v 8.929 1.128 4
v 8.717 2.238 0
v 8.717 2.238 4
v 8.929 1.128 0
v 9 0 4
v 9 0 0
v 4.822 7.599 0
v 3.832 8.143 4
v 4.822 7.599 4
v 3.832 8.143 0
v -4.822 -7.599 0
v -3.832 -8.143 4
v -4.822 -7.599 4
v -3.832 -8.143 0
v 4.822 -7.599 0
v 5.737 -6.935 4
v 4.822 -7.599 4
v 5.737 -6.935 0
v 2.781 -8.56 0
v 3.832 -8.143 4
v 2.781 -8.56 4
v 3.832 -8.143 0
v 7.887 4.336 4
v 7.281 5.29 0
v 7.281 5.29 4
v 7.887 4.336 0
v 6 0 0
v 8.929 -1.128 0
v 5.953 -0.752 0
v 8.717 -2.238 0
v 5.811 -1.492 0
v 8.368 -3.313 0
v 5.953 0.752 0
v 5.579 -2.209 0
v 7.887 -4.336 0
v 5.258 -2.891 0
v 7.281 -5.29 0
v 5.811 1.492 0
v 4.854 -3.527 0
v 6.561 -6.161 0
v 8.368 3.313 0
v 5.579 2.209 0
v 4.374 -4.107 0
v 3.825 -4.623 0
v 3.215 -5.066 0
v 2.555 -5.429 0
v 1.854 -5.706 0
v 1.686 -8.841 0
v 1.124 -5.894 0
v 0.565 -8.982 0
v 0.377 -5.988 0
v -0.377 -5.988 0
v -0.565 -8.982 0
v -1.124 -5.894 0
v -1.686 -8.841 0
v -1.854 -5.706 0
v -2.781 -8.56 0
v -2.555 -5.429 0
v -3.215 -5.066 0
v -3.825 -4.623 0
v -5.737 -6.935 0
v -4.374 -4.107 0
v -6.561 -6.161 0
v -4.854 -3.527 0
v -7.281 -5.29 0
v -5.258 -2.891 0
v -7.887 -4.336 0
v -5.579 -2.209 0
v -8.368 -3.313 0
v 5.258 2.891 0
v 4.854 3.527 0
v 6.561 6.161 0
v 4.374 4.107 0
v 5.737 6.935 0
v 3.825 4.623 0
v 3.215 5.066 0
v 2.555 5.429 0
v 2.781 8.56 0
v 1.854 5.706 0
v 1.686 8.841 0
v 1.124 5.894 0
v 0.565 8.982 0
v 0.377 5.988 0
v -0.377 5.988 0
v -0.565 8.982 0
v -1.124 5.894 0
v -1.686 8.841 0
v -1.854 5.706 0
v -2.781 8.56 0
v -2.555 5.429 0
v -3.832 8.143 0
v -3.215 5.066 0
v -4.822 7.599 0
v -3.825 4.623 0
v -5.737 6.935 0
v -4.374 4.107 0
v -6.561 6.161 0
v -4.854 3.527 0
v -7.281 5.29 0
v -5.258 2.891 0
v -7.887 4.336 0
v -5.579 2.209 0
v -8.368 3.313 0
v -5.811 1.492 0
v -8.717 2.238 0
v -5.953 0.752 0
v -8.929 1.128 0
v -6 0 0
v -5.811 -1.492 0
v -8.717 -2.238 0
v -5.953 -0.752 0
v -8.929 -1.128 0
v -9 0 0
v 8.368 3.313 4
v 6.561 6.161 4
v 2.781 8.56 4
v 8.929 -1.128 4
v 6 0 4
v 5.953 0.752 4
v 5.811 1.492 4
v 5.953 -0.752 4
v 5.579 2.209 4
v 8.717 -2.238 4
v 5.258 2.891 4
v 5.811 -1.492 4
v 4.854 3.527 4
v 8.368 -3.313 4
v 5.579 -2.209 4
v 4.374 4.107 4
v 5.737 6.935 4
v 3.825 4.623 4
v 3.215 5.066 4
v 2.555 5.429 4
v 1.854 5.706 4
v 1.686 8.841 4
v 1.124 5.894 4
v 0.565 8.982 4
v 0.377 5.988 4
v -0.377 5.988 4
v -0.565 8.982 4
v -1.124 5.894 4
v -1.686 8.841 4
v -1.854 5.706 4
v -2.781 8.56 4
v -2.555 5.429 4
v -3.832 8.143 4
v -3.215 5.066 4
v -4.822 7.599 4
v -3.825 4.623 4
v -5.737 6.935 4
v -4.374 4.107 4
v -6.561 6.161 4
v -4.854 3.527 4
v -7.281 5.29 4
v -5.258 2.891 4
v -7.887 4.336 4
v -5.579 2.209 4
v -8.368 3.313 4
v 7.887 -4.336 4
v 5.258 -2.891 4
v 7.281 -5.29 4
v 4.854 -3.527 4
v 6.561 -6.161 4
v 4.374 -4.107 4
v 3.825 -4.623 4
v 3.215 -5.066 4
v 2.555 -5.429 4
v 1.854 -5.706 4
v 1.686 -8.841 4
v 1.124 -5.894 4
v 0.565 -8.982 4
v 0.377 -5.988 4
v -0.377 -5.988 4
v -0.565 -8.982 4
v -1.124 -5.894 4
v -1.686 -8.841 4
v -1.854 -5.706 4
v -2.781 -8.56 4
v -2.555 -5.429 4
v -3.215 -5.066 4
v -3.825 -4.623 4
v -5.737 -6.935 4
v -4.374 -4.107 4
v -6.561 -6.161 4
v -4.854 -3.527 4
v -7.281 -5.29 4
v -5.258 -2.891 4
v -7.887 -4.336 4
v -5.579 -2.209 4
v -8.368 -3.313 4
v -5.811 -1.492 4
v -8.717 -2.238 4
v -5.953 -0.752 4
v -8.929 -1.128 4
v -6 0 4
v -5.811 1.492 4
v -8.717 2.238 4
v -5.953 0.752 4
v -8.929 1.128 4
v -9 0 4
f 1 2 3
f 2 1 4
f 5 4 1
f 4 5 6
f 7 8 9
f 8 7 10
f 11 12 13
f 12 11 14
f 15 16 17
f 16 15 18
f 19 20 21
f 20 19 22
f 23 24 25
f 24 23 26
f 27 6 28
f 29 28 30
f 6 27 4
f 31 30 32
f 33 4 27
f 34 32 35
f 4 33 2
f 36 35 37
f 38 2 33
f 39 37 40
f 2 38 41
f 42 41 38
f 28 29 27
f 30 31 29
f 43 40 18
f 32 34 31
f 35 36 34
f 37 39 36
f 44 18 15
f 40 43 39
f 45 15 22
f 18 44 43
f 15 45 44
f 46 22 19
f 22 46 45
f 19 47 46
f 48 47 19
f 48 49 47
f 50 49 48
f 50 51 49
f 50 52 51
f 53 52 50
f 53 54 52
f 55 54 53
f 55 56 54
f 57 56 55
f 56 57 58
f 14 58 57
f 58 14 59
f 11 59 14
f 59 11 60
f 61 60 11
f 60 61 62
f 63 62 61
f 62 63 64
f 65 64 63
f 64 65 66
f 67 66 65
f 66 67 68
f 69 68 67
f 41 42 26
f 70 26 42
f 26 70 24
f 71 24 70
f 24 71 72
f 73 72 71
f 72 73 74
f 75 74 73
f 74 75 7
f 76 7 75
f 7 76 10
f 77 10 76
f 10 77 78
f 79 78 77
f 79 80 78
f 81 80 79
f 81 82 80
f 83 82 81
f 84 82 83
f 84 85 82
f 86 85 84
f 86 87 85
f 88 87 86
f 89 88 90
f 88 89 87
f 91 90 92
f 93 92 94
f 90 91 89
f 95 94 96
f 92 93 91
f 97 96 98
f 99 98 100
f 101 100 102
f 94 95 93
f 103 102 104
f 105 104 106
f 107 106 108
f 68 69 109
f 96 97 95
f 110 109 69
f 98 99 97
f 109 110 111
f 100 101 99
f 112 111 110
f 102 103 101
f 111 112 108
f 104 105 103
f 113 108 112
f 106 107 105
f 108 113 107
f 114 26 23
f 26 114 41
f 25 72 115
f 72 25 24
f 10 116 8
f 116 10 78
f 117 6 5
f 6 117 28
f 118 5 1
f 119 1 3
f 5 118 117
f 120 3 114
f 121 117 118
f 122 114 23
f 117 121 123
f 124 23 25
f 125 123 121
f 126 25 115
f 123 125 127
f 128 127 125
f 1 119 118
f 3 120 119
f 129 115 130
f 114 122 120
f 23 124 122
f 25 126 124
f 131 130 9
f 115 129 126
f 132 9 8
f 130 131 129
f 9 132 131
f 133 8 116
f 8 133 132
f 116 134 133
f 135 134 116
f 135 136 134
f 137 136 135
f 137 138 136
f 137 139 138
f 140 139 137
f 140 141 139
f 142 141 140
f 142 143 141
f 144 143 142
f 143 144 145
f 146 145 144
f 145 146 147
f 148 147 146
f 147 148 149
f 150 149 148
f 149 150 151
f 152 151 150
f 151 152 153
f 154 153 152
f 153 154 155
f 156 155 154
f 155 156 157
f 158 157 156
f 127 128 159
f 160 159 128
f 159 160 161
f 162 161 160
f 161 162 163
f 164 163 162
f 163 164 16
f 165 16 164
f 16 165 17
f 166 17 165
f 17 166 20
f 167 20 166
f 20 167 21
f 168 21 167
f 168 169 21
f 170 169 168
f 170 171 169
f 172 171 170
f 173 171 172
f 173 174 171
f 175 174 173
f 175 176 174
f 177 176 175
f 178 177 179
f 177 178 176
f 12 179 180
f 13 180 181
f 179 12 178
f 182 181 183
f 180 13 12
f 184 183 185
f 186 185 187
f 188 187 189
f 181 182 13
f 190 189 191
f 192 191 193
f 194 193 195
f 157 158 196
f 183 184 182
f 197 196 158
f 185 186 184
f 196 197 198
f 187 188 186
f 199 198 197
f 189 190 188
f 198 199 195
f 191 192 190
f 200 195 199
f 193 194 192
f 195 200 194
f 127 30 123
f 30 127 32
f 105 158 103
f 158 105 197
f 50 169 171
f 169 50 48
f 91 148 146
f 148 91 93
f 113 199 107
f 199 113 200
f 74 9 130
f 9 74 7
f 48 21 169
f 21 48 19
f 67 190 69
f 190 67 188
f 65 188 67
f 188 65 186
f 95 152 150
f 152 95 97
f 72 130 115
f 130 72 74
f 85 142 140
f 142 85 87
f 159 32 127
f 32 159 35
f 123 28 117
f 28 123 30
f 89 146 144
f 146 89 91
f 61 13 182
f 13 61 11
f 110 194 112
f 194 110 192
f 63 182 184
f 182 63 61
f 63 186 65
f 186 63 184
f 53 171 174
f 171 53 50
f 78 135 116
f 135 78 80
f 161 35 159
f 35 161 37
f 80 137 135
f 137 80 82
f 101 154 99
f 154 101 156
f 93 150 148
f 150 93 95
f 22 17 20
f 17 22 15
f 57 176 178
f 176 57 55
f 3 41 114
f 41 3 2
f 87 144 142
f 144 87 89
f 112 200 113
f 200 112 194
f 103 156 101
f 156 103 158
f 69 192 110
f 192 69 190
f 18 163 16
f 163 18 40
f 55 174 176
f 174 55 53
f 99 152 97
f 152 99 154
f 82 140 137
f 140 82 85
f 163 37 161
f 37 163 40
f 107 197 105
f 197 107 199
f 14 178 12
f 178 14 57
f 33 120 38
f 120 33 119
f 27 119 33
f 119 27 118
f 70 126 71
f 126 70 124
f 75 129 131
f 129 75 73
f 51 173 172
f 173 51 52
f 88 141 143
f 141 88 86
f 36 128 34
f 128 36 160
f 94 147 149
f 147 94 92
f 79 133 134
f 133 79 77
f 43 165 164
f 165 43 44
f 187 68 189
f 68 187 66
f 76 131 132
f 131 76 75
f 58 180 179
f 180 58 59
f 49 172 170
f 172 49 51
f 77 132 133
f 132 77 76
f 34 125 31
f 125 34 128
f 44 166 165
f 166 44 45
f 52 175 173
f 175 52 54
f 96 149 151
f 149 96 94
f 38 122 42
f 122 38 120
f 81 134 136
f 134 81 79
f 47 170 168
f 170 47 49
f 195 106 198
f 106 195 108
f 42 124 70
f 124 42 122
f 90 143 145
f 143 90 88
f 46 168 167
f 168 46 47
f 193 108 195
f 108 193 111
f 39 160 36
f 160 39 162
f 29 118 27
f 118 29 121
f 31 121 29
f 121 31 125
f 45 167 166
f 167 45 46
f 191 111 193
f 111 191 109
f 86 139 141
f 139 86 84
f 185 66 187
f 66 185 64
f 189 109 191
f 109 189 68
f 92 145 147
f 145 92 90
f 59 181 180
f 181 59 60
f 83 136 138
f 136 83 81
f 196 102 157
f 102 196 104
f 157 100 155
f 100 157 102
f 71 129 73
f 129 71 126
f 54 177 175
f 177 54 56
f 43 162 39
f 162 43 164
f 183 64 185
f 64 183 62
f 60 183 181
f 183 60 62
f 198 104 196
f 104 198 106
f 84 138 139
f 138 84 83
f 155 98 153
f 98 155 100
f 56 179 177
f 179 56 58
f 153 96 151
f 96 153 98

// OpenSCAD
$fn = 50;


difference() {
	union() {
		cylinder(h = 4, r = 9.0000000000);
	}
	union() {
		cylinder(h = 4, r = 6.0000000000);
	}
}
